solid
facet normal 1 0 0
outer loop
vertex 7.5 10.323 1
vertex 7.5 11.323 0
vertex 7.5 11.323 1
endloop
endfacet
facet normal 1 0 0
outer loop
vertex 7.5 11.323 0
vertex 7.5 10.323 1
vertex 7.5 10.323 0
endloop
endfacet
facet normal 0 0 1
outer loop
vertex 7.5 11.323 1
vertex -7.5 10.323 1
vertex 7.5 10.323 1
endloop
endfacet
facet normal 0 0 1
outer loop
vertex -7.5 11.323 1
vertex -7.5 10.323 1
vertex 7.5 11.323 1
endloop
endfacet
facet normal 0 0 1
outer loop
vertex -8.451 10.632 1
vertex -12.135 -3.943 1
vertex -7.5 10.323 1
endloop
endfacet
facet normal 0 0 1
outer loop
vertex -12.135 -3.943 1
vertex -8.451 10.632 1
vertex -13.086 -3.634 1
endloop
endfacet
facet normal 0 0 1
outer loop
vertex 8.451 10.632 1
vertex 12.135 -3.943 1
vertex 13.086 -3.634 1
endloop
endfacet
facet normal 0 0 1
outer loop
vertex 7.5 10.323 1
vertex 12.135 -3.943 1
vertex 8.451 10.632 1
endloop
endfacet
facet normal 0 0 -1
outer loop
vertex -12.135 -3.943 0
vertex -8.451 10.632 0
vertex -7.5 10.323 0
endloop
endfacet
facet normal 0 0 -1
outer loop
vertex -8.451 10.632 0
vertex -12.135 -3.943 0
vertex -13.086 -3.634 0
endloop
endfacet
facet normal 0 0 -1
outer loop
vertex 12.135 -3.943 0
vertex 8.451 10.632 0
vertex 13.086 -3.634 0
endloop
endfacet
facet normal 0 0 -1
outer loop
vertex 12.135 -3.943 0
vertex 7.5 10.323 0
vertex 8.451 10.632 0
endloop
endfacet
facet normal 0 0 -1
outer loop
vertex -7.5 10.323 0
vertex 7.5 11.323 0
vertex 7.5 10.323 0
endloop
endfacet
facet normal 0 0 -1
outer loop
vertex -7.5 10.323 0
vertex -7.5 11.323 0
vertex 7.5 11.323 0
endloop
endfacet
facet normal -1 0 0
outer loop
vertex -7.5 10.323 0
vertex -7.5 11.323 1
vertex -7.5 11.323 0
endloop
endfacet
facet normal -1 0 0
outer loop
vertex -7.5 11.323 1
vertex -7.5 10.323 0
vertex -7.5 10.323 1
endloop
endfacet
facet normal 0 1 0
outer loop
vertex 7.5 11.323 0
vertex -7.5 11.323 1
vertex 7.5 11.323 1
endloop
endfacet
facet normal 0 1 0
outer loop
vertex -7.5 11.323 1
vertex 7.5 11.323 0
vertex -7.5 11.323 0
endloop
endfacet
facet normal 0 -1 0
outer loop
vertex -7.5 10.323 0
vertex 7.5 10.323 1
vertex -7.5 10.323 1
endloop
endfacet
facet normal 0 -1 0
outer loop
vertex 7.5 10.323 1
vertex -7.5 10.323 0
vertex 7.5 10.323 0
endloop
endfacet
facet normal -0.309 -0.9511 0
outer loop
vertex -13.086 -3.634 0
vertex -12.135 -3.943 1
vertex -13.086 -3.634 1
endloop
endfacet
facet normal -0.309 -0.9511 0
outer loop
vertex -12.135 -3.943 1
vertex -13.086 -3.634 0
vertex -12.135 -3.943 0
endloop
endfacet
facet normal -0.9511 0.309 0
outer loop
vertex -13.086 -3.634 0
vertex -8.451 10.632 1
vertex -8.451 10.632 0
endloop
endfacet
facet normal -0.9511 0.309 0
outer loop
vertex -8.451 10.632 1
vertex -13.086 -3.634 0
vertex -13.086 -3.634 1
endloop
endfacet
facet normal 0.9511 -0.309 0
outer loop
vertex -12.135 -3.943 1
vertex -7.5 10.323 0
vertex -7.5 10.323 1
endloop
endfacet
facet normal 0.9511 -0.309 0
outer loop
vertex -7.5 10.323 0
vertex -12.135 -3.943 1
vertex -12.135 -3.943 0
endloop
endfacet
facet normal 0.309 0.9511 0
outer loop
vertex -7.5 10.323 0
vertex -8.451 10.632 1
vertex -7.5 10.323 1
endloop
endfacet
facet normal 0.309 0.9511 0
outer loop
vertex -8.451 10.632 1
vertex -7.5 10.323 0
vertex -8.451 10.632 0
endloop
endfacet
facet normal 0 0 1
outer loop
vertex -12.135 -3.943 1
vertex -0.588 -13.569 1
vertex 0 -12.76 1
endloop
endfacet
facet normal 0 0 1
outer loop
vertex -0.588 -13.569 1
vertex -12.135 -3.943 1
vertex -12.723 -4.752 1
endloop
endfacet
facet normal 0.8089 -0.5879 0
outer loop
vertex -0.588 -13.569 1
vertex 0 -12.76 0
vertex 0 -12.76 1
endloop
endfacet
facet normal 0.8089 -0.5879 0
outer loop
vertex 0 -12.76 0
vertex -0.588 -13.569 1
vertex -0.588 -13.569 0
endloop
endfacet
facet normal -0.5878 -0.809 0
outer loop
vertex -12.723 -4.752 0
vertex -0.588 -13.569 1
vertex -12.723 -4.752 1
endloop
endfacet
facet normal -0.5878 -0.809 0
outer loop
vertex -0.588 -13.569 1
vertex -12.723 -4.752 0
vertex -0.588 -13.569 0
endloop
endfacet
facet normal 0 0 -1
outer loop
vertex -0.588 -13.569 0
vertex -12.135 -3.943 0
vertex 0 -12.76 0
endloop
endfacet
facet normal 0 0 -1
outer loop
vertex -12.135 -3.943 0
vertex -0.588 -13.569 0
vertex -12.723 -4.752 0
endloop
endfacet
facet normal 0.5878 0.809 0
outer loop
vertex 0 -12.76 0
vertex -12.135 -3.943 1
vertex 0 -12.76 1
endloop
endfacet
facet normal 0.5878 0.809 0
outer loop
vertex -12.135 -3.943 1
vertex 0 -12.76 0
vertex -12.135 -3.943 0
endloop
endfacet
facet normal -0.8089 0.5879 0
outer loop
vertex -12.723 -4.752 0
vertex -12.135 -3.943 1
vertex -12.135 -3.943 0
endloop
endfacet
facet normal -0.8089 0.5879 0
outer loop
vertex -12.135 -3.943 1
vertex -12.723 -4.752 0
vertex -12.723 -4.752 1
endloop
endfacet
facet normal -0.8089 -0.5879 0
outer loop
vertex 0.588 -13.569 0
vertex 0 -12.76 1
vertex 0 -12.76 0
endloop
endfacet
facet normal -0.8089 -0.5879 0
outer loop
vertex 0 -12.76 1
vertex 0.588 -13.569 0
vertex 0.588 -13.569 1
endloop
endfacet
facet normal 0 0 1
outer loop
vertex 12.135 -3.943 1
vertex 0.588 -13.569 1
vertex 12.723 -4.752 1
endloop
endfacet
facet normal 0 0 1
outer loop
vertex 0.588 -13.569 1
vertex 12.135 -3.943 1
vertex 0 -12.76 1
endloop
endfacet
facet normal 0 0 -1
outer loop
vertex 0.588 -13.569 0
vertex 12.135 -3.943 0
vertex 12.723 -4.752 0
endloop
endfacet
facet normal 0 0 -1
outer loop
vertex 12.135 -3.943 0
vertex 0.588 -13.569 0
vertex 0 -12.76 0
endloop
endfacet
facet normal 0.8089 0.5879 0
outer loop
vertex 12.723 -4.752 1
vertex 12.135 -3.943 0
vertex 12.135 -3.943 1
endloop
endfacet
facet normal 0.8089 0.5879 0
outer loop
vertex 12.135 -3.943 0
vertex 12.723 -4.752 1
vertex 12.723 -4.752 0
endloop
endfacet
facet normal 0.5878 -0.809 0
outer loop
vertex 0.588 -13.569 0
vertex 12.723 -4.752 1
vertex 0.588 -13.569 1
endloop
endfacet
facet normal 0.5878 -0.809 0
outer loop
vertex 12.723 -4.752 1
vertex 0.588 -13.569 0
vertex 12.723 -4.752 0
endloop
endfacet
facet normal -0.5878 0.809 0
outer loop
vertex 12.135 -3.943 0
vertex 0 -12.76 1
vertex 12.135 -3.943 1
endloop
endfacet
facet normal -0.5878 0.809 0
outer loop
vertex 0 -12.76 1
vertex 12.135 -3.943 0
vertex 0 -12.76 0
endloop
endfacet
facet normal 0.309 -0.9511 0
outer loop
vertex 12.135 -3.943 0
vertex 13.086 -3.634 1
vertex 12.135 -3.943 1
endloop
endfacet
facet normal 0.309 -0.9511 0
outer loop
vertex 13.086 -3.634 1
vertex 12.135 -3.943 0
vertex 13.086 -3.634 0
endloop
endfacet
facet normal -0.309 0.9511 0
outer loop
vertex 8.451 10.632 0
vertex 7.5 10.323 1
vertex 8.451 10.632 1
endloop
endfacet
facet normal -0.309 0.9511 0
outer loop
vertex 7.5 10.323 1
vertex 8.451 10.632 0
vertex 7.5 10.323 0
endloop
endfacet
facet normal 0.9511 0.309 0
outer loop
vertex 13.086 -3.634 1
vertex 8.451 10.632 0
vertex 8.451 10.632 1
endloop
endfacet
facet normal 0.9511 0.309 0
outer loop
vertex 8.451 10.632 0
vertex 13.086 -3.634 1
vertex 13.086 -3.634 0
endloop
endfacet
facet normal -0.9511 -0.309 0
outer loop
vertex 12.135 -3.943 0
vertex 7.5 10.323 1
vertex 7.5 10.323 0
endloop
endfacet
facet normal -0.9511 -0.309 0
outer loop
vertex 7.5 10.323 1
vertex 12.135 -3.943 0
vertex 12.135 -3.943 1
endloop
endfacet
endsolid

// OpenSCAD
sides = 5;
length = 15;
interior_angle = (sides - 2) * 180 / sides;
adjacent = length * .5;
opposite = tan(interior_angle * .5) * adjacent;



for (i = [0:sides-1]) {
    rotate([0, 0, 360 / sides * i])
     translate([0, opposite, 0])
      translate([-length*.5, 0, 0])
       cube([length, 1, 1]);
}
